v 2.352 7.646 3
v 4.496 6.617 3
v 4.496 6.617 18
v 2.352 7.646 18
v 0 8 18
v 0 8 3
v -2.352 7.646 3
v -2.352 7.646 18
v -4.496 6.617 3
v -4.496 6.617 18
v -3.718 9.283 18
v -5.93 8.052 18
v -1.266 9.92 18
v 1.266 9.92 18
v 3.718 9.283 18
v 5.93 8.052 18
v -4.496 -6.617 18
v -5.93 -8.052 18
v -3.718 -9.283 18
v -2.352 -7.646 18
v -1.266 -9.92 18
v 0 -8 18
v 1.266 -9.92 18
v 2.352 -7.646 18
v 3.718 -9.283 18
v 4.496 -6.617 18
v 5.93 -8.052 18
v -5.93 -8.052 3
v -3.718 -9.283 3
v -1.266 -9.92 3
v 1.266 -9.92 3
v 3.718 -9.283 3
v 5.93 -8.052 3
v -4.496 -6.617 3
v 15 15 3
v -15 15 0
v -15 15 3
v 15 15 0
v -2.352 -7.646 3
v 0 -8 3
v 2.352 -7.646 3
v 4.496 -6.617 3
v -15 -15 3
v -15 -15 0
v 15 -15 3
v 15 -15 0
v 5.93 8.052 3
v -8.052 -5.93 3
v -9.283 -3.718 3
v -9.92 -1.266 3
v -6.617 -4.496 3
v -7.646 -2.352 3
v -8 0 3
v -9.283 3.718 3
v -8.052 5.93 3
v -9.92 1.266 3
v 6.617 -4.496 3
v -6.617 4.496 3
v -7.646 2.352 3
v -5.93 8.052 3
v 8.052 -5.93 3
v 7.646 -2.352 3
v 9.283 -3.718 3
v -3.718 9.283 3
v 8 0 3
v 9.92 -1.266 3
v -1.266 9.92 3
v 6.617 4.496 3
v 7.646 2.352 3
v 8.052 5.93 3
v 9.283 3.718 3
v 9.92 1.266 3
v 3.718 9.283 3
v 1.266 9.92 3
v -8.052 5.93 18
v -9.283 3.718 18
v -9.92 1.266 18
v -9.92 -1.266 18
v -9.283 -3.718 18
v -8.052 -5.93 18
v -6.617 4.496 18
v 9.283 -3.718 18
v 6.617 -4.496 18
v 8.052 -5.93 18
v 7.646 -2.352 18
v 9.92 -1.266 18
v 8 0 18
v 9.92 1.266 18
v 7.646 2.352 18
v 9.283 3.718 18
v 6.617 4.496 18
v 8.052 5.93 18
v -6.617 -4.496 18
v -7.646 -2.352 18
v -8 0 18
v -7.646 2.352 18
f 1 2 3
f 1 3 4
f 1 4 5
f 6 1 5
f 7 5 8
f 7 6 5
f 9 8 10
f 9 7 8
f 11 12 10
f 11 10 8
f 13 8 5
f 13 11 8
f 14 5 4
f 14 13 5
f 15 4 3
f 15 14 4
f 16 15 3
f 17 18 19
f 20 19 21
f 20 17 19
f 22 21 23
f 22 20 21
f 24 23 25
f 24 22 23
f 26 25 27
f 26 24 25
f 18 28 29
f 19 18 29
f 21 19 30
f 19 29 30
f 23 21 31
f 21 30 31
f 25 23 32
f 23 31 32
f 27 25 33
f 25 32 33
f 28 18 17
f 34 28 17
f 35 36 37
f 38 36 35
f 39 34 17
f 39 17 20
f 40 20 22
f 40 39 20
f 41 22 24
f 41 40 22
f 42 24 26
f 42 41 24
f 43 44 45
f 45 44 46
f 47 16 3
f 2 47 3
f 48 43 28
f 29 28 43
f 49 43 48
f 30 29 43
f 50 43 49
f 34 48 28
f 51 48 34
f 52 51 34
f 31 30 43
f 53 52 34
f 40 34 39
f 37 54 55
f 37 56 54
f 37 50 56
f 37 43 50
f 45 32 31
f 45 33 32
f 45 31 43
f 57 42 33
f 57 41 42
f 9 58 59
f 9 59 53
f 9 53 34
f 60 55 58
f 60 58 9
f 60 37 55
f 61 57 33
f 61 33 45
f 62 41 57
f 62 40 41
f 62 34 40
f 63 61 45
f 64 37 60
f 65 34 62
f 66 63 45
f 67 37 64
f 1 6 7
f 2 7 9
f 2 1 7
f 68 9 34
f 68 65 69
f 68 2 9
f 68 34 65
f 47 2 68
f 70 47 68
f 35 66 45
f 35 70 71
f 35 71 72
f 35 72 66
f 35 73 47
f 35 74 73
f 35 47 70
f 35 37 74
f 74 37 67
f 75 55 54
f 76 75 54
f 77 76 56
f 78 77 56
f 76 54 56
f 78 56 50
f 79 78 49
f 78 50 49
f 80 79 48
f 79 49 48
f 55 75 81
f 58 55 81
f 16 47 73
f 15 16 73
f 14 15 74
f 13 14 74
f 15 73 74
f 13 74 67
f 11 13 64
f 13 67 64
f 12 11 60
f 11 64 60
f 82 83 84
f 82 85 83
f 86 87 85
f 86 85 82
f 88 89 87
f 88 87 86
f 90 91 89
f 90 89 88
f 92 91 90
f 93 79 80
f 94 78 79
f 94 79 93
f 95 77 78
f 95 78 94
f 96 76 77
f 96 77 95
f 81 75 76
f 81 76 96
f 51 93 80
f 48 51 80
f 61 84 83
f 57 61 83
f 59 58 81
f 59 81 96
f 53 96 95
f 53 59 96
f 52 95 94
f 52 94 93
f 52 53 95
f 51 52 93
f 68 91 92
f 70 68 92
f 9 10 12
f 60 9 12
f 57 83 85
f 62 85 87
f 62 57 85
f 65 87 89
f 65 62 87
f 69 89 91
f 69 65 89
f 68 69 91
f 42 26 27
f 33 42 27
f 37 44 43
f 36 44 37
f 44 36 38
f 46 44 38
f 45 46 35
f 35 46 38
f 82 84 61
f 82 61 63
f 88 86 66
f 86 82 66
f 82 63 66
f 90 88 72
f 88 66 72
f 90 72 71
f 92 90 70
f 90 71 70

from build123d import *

# Parameters (mm, degrees)
F0_W     = 30
F0_H     = 30
F1_DEPTH = 3
F2_R     = 10
F2_R_2   = 8
F3_DEPTH = 15
F5_DEPTH = 15


with BuildPart() as f1:
    # F0 (on Top) → F1 (new body)
    with BuildSketch(Plane.XY):
        Rectangle(F0_W, F0_H)
    extrude(amount=F1_DEPTH)

    # F2 (on face) → F3 (join)
    with BuildSketch(Plane.XY.offset(3)):
        Circle(F2_R)
        Circle(F2_R_2, mode=Mode.SUBTRACT)
    extrude(amount=F3_DEPTH)

    # F4 (on face) → F5 (cut, through all)
    with BuildSketch(Plane.XY.offset(18)):
        with BuildLine():
            Line((-4.495868, 6.617188), (-5.930406, 8.051726))
            ThreePointArc((-5.930406, 8.051726), (-7.071068, 7.071068), (-8.051726, 5.930406))
            Line((-8.051726, 5.930406), (-6.617188, 4.495868))
            ThreePointArc((-6.617188, 4.495868), (-5.656854, 5.656854), (-4.495868, 6.617188))
        make_face()
        with BuildLine():
            ThreePointArc((8.051726, 5.930406), (7.071068, 7.071068), (5.930406, 8.051726))
            Line((5.930406, 8.051726), (4.495868, 6.617188))
            ThreePointArc((4.495868, 6.617188), (5.656854, 5.656854), (6.617188, 4.495868))
            Line((6.617188, 4.495868), (8.051726, 5.930406))
        make_face()
        with BuildLine():
            ThreePointArc((5.930406, -8.051726), (7.071068, -7.071068), (8.051726, -5.930406))
            Line((8.051726, -5.930406), (6.617188, -4.495868))
            ThreePointArc((6.617188, -4.495868), (5.656854, -5.656854), (4.495868, -6.617188))
            Line((4.495868, -6.617188), (5.930406, -8.051726))
        make_face()
        with BuildLine():
            Line((-6.617188, -4.495868), (-8.051726, -5.930406))
            ThreePointArc((-8.051726, -5.930406), (-7.071068, -7.071068), (-5.930406, -8.051726))
            Line((-5.930406, -8.051726), (-4.495868, -6.617188))
            ThreePointArc((-4.495868, -6.617188), (-5.656854, -5.656854), (-6.617188, -4.495868))
        make_face()
    extrude(amount=-F5_DEPTH, mode=Mode.SUBTRACT)


solid = f1.part
